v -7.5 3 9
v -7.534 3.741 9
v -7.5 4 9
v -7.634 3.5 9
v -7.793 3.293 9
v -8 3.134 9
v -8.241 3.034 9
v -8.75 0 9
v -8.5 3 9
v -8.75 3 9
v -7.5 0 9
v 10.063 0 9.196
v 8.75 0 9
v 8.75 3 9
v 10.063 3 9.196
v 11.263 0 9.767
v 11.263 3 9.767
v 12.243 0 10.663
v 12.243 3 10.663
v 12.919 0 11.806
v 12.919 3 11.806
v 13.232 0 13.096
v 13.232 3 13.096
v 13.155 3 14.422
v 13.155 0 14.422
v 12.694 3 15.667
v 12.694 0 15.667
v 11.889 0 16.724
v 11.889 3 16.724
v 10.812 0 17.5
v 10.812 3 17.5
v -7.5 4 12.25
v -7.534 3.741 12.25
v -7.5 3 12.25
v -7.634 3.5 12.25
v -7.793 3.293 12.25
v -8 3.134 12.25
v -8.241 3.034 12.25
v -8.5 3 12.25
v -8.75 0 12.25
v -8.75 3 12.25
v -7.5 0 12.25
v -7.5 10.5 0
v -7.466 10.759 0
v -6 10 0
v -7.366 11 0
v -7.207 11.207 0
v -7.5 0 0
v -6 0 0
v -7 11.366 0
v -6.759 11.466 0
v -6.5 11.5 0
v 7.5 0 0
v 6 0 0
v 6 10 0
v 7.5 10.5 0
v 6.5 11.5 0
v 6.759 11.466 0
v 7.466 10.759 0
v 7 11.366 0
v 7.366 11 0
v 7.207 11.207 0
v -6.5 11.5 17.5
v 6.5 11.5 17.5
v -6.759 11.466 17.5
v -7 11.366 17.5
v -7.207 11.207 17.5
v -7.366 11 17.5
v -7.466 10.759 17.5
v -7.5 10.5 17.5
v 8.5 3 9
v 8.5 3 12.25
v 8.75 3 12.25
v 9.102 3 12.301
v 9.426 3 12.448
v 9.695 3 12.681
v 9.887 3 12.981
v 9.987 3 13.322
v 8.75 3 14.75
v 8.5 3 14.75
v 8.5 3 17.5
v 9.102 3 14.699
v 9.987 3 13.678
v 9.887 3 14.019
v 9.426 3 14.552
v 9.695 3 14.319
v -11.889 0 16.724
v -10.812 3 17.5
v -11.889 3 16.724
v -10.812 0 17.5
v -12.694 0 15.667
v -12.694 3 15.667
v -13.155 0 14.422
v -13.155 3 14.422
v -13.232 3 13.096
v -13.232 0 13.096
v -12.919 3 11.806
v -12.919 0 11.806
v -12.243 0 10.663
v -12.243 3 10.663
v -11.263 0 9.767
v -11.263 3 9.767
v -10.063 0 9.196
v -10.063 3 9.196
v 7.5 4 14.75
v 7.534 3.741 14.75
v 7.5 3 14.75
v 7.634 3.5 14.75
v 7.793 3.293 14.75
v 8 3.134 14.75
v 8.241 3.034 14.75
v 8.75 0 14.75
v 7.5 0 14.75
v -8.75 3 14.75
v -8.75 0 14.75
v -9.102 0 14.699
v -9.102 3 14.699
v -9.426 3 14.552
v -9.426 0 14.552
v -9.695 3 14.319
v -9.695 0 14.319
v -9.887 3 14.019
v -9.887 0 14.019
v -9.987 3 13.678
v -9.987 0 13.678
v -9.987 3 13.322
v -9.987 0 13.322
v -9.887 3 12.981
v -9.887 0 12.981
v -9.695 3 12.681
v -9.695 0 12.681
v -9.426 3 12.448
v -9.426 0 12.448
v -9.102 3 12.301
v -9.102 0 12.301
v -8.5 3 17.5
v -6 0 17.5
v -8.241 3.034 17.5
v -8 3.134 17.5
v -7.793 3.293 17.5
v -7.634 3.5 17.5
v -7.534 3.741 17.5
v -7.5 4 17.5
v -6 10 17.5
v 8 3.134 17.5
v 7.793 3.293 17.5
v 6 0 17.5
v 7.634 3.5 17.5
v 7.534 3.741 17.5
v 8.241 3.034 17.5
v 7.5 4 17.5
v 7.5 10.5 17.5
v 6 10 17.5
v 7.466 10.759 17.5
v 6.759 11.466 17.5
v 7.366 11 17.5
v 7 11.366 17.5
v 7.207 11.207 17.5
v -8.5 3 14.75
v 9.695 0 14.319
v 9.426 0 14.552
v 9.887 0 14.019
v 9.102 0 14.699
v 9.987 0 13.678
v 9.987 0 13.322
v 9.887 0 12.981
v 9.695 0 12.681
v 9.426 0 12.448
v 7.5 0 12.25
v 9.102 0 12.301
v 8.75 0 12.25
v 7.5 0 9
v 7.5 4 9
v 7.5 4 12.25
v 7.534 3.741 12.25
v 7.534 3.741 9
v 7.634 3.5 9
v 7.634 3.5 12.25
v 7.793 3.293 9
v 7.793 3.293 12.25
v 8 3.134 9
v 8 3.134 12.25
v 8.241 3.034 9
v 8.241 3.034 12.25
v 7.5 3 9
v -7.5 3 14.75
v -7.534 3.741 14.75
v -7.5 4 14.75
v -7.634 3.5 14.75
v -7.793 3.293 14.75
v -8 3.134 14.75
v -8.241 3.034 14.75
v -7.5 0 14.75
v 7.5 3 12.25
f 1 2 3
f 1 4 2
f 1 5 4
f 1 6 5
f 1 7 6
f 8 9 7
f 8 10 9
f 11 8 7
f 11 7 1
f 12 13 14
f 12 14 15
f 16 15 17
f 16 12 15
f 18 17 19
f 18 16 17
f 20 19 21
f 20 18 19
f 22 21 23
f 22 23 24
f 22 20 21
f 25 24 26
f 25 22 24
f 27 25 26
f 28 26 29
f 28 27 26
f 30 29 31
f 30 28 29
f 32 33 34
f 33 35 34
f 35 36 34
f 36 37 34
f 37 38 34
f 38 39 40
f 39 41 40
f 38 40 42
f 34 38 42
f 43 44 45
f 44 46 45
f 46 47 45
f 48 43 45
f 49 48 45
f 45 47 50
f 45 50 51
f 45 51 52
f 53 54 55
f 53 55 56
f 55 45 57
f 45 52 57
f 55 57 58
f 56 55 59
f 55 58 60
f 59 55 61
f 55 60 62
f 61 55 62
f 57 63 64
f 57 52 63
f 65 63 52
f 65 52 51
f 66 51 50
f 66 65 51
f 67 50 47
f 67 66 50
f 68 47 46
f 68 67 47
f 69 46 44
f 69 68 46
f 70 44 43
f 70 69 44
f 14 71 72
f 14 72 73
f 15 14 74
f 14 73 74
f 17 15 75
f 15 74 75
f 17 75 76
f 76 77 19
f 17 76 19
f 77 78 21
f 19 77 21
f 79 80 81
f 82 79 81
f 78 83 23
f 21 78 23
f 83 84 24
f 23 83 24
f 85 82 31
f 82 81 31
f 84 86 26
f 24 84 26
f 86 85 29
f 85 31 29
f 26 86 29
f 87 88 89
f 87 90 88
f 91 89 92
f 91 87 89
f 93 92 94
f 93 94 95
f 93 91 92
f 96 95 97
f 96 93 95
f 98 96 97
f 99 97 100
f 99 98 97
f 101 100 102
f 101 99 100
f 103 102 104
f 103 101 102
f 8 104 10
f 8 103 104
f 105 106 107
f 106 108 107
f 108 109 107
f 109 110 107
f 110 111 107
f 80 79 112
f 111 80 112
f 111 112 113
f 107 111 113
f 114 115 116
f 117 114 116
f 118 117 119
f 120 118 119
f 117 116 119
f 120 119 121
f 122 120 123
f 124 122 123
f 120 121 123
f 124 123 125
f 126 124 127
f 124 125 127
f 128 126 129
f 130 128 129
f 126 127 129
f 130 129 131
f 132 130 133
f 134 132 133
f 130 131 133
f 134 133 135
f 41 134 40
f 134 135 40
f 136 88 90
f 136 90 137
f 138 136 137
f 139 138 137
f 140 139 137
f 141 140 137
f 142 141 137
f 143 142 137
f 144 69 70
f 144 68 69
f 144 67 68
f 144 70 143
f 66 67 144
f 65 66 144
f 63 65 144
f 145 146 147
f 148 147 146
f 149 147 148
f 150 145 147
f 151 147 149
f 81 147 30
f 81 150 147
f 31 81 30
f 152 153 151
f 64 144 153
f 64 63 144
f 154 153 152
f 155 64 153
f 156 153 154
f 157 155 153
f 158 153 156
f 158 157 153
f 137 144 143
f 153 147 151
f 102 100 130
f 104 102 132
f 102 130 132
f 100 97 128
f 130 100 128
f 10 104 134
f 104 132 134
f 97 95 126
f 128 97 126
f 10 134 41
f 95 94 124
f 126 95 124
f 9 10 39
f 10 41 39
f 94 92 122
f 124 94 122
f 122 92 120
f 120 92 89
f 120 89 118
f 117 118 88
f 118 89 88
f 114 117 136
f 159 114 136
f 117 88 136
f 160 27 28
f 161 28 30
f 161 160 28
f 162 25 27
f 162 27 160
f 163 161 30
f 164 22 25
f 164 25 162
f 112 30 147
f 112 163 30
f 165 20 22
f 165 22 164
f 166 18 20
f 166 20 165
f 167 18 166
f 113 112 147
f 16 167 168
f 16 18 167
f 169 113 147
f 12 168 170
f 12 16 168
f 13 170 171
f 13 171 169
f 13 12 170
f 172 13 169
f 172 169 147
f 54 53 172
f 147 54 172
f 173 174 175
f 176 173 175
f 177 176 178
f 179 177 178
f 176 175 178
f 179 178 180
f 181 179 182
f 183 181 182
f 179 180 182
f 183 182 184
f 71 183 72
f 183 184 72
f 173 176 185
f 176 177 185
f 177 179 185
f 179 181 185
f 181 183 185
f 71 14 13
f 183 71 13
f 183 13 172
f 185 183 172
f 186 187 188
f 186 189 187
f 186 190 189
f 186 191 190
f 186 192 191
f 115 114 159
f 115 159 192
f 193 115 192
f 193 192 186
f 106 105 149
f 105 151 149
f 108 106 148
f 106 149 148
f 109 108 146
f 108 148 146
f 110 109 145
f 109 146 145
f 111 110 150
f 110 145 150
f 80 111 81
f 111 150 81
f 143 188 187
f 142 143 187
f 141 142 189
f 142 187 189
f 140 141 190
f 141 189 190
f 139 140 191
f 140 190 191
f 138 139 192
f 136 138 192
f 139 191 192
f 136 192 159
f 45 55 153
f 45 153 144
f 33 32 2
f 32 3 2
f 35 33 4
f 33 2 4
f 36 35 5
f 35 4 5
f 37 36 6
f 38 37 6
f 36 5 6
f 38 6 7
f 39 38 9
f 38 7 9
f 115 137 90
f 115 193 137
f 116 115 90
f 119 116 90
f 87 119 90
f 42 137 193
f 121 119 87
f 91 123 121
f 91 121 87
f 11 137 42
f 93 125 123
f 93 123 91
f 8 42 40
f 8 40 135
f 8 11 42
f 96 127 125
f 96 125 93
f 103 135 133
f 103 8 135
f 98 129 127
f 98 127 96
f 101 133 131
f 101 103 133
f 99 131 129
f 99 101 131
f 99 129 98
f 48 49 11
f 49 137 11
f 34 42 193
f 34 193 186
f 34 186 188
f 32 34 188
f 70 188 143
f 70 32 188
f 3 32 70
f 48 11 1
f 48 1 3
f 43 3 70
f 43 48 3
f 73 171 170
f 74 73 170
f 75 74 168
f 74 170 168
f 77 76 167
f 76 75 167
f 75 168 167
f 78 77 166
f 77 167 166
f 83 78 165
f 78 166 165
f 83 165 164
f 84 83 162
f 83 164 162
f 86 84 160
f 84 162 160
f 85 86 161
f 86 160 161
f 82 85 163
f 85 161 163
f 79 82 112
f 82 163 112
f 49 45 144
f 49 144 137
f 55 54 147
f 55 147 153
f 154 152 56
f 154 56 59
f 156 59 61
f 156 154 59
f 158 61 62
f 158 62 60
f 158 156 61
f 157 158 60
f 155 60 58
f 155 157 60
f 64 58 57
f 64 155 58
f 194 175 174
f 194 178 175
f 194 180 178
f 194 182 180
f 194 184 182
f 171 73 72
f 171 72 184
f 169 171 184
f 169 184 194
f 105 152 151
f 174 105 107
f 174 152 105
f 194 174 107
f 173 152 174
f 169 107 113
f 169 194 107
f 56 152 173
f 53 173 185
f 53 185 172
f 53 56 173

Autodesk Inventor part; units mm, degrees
ref_plane "YZ Plane" through (0, 0, 0) normal (1, 0, 0) x (0, 1, 0)
ref_plane "XZ Plane" through (0, 0, 0) normal (0, 1, 0) x (-1, 0, 0)
ref_plane "XY Plane" through (0, 0, 0) normal (0, 0, 1) x (1, 0, 0)
sketch "Esquisse1" plane through (0, 0, 0) normal (0, 0, 1) x (1, 0, 0)
  line L0 (7.5, 0) -> (-7.5, 0)
  line L1 (-7.5, 0) -> (-7.5, 11.5)
  line L2 (-7.5, 11.5) -> (7.5, 11.5)
  line L3 (7.5, 11.5) -> (7.5, 0)
  point P0 (0, 0)
  dimension "d0" = 15
  dimension "d1" = 11.5
  dimension "d2" = 0
  dimension "d3" = 7.5
extrude "Extrusion1" add sketch "Esquisse1" along normal blind 17.5
sketch "Esquisse2" plane through (0, 0, 17.5) normal (0, 0, 1) x (1, 0, 0)
  line L0 (-7.5, 0) -> (7.5, 0) projected
  line L1 (7.5, 0) -> (7.5, 11.5) projected
  line L2 (7.5, 11.5) -> (-7.5, 11.5) projected
  line L3 (-7.5, 11.5) -> (-7.5, 0) projected
  line L4 (-6, 0) -> (6, 0)
  line L5 (6, 0) -> (6, 10)
  line L6 (6, 10) -> (-6, 10)
  line L7 (-6, 10) -> (-6, 0)
  point P0 (0, 0)
  dimension "d6" = 1.5
  dimension "d7" = 1.5
  dimension "d8" = 1.5
extrude "Extrusion2" cut sketch "Esquisse2" against normal through all contours L7 L6 L5 L0
fillet "Congé1" radius 1 2 edges at (7.5, 11.5, 8.75) (-7.5, 11.5, 8.75)
sketch "Esquisse4" plane through (7.5, 0, 0) normal (0, -1, 0) x (1, 0, 0)
  line L0 (0, 0) -> (0, 17.5) projected
  circle A0 centre (-16.25, 13.5) radius 1.25
  circle A1 centre (1.25, 13.5) radius 1.25
  line L1 (1.25, 9) -> (0, 9)
  line L2 (-16.25, 9) -> (-15, 9)
  line L3 (-16.25, 14.75) -> (-15, 14.75)
  line L4 (-16.25, 12.25) -> (-15, 12.25)
  line L5 (1.25, 14.75) -> (0, 14.75)
  line L6 (1.25, 12.25) -> (0, 12.25)
  line L7 (0, 12.25) -> (0, 9)
  line L8 (0, 17.5) -> (0, 14.75)
  line L9 (-15, 17.5) -> (-15, 14.75)
  line L10 (-15, 12.25) -> (-15, 9)
  arc A2 (-18.3116, 17.5) -> (-16.25, 9) centre (-16.25, 13.5) ccw
  line L11 (-13.5, 17.5) -> (-1.5, 17.5) projected
  arc A3 (1.25, 9) -> (3.3116, 17.5) centre (1.25, 13.5) ccw
  line L12 (-18.3116, 17.5) -> (-15, 17.5)
  line L13 (0, 17.5) -> (3.3116, 17.5)
  point P0 (-7.5, 0)
  dimension "d12" = 2.5
  dimension "d13" = 2.5
  dimension "d14" = 17.5
  dimension "d15" = 8.75
  dimension "d18" = 4
  dimension "d22" = 4.5
  dimension "d23" = 3.25
  dimension "d24" = 5.25
  dimension "d25" = 4.5
  dimension "d26" = 3.25
  dimension "d27" = 152.734
  dimension "d28" = 152.734
extrude "Extrusion5" add sketch "Esquisse4" against normal blind 3 contours L0 L6 A1 L5 L13 A3 L1 | A0 L4 L10 L2 A2 L12 L9 L3
fillet "Congé2" radius 1 4 edges at (-7.5, 3, 10.625) (-7.5, 3, 16.125) (7.5, 3, 16.125) (7.5, 3, 10.625)
equation "\"d3\" = 0.5 * d0"
equation "\"d15\" = 0.5 * d14"
properties part number "fixation moteur" material "Plastique ABS"
